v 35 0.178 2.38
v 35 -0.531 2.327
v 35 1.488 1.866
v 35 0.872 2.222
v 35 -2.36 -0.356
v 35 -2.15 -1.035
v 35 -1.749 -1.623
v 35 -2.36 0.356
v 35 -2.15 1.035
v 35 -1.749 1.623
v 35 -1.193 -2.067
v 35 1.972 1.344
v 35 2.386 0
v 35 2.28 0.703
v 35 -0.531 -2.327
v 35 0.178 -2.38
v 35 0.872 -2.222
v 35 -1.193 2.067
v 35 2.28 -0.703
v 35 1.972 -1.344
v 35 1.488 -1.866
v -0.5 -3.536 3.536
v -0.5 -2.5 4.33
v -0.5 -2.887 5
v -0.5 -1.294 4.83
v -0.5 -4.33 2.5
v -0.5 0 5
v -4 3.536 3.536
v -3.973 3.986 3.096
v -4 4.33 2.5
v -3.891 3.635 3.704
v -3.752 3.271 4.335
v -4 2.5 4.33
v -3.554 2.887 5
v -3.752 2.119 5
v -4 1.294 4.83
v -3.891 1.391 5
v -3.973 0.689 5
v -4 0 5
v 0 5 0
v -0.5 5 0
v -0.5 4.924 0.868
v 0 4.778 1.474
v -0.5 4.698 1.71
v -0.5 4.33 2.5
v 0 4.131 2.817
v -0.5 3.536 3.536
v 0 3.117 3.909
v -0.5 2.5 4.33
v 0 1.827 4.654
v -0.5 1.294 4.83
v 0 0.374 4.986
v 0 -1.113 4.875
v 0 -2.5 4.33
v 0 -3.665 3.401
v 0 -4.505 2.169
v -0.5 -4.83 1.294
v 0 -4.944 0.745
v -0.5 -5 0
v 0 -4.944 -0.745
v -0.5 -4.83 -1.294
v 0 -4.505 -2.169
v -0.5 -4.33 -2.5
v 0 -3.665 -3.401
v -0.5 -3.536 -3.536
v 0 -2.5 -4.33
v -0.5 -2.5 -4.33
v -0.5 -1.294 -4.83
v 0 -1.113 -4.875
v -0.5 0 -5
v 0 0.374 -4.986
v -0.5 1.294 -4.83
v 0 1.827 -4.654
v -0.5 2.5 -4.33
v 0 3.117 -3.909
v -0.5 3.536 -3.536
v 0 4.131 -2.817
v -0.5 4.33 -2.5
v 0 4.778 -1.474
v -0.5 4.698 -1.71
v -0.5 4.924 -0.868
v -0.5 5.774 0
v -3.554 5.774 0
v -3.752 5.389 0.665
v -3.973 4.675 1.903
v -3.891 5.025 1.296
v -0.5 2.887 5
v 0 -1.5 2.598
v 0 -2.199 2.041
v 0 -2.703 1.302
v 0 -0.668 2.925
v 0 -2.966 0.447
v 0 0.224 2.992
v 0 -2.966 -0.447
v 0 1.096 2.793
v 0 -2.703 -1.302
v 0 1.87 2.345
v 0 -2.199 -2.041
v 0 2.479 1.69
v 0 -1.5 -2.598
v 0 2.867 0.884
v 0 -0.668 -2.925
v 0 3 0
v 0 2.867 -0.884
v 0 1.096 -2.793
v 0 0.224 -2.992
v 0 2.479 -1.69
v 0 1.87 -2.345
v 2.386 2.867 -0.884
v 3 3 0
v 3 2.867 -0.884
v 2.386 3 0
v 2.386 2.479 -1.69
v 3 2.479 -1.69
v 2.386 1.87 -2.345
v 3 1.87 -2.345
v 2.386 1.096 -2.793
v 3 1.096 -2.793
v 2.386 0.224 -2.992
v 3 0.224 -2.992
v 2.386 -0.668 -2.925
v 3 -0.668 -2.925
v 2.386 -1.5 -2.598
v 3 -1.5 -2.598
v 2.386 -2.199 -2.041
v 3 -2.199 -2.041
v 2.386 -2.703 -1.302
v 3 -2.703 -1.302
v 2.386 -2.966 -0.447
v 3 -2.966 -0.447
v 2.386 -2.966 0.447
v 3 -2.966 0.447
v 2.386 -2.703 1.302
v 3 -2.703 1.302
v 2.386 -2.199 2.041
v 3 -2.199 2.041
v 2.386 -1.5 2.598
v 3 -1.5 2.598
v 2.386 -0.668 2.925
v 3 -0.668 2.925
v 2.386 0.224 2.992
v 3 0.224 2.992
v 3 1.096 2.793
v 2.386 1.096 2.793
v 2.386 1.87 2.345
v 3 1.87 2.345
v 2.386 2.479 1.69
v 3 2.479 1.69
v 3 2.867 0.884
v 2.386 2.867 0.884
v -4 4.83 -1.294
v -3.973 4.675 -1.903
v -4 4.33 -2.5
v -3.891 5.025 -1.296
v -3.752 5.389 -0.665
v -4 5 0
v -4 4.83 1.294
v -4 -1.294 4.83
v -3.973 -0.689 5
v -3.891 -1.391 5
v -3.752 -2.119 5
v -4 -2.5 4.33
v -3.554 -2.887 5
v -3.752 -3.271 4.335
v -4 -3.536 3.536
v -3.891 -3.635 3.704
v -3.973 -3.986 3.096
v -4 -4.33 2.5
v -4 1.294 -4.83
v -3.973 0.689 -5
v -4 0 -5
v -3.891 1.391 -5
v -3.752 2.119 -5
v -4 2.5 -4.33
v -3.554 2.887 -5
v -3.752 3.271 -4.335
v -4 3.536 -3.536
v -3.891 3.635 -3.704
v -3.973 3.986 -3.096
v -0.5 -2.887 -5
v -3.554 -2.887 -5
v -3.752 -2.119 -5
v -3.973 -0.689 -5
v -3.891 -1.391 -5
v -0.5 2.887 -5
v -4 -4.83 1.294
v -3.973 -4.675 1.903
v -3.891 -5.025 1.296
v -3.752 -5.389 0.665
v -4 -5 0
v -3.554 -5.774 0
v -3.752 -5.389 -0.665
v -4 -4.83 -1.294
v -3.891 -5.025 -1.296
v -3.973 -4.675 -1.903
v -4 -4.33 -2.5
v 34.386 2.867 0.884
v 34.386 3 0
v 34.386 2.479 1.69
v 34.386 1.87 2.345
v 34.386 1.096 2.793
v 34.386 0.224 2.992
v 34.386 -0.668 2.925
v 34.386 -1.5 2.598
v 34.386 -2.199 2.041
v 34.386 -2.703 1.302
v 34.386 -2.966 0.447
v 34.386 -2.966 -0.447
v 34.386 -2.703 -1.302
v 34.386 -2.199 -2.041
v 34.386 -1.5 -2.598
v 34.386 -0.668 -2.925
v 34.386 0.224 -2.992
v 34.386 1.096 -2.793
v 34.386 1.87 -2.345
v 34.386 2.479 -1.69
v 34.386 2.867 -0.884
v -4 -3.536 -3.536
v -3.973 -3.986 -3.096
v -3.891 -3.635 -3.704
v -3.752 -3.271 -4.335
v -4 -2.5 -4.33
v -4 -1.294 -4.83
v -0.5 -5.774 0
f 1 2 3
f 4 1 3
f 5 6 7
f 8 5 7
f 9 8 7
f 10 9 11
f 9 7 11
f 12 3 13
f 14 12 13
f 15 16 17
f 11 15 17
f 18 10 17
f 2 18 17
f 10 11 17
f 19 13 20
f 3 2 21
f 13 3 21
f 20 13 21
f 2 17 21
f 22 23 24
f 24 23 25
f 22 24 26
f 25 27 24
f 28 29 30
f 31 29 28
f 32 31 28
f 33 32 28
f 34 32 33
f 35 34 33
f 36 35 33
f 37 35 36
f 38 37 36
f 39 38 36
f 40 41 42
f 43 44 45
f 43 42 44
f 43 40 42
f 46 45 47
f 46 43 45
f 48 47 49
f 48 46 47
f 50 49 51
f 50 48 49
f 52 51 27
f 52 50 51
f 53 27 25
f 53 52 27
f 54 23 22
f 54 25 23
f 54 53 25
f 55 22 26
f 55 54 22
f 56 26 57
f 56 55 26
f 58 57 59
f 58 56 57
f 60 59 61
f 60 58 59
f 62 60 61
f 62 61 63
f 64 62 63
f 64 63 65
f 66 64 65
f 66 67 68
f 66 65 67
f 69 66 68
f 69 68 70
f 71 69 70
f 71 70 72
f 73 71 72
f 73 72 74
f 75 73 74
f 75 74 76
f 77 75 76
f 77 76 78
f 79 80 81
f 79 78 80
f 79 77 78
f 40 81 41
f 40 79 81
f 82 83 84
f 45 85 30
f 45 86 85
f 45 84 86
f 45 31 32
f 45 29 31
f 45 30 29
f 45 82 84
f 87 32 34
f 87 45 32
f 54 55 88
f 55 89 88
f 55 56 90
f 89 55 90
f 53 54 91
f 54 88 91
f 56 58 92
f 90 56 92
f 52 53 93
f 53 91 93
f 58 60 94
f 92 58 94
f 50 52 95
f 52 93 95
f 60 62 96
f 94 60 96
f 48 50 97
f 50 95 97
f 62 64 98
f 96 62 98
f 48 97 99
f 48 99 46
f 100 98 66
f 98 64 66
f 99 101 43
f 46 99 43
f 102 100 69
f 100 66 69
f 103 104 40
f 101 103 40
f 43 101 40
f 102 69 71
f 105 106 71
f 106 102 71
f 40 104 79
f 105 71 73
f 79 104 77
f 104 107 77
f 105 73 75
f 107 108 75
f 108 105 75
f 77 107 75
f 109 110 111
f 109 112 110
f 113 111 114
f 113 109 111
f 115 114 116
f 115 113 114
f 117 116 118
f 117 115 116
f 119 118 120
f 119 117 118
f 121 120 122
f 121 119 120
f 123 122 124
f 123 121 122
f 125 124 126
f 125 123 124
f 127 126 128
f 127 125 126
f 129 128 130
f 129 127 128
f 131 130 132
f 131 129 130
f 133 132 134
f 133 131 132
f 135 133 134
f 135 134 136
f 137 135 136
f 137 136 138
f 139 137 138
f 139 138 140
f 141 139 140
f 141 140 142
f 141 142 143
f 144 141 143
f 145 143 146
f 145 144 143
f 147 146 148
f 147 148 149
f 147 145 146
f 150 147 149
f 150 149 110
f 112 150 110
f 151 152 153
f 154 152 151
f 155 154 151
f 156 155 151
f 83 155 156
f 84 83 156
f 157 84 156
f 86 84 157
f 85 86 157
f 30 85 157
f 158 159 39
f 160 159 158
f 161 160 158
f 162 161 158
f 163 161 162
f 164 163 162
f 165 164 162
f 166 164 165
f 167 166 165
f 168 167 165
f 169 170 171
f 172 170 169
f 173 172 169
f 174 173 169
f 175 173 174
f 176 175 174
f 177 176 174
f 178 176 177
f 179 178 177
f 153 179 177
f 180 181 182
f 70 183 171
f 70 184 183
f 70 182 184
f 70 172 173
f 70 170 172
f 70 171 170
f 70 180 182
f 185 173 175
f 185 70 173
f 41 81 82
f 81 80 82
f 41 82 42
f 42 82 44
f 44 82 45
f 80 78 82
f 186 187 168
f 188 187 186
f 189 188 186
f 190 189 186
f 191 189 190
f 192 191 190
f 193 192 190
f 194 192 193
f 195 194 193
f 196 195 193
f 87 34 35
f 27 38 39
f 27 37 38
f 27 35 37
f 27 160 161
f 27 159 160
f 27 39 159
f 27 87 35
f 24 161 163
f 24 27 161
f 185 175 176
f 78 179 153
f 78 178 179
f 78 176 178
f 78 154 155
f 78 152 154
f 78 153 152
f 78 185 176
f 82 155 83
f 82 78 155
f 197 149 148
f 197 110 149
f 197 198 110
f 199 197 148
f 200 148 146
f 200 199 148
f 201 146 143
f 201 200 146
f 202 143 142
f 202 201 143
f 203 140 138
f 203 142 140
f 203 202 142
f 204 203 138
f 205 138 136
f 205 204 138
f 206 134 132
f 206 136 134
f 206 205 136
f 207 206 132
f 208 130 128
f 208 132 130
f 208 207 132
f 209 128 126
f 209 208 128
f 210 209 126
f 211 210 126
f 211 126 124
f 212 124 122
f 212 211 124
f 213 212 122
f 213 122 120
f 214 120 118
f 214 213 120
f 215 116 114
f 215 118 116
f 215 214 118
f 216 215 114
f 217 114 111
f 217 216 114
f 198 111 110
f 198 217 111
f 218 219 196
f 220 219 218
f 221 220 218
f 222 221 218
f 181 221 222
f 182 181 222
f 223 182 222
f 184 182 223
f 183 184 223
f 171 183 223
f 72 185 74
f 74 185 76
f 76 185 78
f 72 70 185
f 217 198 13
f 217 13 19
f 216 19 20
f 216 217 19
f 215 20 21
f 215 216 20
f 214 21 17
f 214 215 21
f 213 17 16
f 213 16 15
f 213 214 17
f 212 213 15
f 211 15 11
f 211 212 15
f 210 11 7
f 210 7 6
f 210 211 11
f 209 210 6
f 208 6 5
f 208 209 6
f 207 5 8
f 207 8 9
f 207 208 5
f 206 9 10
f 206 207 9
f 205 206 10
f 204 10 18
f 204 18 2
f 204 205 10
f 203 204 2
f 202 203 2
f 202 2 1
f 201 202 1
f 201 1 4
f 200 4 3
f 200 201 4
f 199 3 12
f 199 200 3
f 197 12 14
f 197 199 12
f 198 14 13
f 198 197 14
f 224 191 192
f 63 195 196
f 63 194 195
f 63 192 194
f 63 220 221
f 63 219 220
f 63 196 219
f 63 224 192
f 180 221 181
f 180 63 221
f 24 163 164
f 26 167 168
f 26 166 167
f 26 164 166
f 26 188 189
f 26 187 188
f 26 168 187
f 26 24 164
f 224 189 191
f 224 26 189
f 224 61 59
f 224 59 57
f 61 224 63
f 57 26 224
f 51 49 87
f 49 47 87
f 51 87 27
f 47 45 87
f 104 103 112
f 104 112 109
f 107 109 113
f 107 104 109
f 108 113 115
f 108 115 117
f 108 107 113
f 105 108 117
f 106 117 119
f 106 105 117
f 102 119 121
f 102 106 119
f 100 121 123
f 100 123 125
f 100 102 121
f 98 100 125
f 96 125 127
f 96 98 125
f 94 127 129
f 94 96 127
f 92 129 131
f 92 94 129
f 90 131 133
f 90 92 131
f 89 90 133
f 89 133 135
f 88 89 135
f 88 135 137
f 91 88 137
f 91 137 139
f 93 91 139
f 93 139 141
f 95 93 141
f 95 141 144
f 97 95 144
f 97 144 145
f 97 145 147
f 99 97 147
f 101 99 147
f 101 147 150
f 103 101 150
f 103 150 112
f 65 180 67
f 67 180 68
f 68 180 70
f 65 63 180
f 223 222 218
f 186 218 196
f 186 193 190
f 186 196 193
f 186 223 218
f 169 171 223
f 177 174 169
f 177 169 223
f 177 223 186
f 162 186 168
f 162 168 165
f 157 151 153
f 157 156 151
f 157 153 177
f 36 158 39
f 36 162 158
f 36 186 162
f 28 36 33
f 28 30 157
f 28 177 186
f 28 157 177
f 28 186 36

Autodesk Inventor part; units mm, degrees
ref_plane "YZ Plane" through (0, 0, 0) normal (1, 0, 0) x (0, 1, 0)
ref_plane "XZ Plane" through (0, 0, 0) normal (0, 1, 0) x (-1, 0, 0)
sketch "Sketch1" plane through (0, 0, 0) normal (0, 0, 1) x (1, 0, 0)
  line L0 (0, 5) -> (0, 3)
  line L1 (3, 3) -> (35, 3)
  line L2 (35, 3) -> (35, 0)
  line L3 (35, 0) -> (-0.5001, 0)
  line L4 (-7.6001, 0) -> (42.1, 0) projected
  line L5 (-0.5001, 0) -> (-0.5001, 5)
  line L6 (-0.5001, 5) -> (0, 5)
  line L7 (3, 3) -> (2.3865, 3)
  line L8 (2.3865, 3) -> (0, 3)
  line L9 (0, -1) -> (0, 6) projected
  dimension "d0" = 35
  dimension "d1" = 32
  dimension "d2" = 6
  dimension "d9" = 0.5001
  dimension "d10" = 10
  dimension "d13" = 0.6136
  dimension "d14" = 6
revolve "Body" add sketch "Sketch1" angle 360 about axis through (35, 0, 0) along (-1, 0, 0)
sketch "Sketch2" plane through (-0.5001, 0, 0) normal (-1, 0, 0) x (0, 0, 1)
  line L0 (0, 5.7735) -> (5, 2.8868)
  line L1 (5, 2.8868) -> (5, -2.8868)
  line L2 (5, -2.8868) -> (0, -5.7735)
  line L3 (0, -5.7735) -> (-5, -2.8868)
  line L4 (-5, -2.8868) -> (-5, 2.8868)
  line L5 (-5, 2.8868) -> (0, 5.7735)
  point P0 (0, 0)
  point P1 (0, 0)
  dimension "d11" = 10
extrude "Head" add sketch "Sketch2" along normal blind 3.5
sketch "Sketch4" plane through (0, 0, 0) normal (0, 0, 1) x (1, 0, 0)
  line L0 (-4.0001, 5) -> (-4.0001, 5.7735)
  line L1 (-4.0001, 5.7735) -> (-3.5535, 5.7735)
  line L2 (-3.5535, 5.7735) -> (-4.0001, 5)
  line L3 (-4.7001, 0) -> (0.1999, 0) projected
  line L4 (-0.5001, 5.7735) -> (-4.0001, 5.7735) projected
  line L5 (-4.0001, 2.8868) -> (-4.0001, 5.7735) projected
  dimension "d5" = 30
  dimension "d19" = 10
revolve "Chamfer1" cut sketch "Sketch4" angle 360 about axis through (-10, 0, 0) along (1, 0, 0)
thread "Thread" size "M6x1" class "6g" standard "ISO Metric profile" length 32
chamfer "Chamfer2" distance 0.6135 distance2 0.6136 1 edges at (35, -3, 0) measured on face at (35, 0.7485, -0.6631)
ref_plane "Work Plane1" through (1.525, 0, 0) normal (0, 0, 1) x (1, 0, 0)
equation "\"d0\" = NLG"
equation "\"d1\" = GEL"
equation "\"d2\" = GD"
equation "\"d10\" = SD2"
equation "\"d14\" = BDM"
equation "\"d11\" = SW"
equation "\"d3\" = KOH - SD"
equation "\"d5\" = ANG1"
equation "\"d19\" = SW0"
equation "\"d15\" = GEL"
equation "\"d6\" = -0.5 * SPD + 0.5 * GD"
equation "\"NLG\" = 35"
equation "\"GD\" = NND"
equation "\"BDM\" = NND"
equation "\"KOH\" = 4"
equation "\"GEL\" = 32"
equation "\"SW\" = 10"
equation "\"SW0\" = SW"
equation "\"SPD\" = NND - 1.2269 * PTC"
equation "\"SD2\" = SW"
equation "\"SD\" = 0.5"
equation "\"ANG1\" = 30deg"
equation "\"GAL\" = 0.61345 * PTC"
equation "\"GUL\" = 0.61345 * PTC"
equation "\"RR\" = 0.25"
equation "\"WFT\" = SD"
equation "\"GD1\" = THREADDIA - 1.2269 * PTC"
equation "\"THREADDIA\" = 6"
equation "\"TOA\" = 30deg"
equation "\"FAWI\" = 45deg"
equation "\"PTC\" = 1"
equation "\"NND\" = 6"
equation "\"E0\" = 1.155 * SW"
properties part number "AS 1110 - M6 x 35" material "Steel, Mild"
